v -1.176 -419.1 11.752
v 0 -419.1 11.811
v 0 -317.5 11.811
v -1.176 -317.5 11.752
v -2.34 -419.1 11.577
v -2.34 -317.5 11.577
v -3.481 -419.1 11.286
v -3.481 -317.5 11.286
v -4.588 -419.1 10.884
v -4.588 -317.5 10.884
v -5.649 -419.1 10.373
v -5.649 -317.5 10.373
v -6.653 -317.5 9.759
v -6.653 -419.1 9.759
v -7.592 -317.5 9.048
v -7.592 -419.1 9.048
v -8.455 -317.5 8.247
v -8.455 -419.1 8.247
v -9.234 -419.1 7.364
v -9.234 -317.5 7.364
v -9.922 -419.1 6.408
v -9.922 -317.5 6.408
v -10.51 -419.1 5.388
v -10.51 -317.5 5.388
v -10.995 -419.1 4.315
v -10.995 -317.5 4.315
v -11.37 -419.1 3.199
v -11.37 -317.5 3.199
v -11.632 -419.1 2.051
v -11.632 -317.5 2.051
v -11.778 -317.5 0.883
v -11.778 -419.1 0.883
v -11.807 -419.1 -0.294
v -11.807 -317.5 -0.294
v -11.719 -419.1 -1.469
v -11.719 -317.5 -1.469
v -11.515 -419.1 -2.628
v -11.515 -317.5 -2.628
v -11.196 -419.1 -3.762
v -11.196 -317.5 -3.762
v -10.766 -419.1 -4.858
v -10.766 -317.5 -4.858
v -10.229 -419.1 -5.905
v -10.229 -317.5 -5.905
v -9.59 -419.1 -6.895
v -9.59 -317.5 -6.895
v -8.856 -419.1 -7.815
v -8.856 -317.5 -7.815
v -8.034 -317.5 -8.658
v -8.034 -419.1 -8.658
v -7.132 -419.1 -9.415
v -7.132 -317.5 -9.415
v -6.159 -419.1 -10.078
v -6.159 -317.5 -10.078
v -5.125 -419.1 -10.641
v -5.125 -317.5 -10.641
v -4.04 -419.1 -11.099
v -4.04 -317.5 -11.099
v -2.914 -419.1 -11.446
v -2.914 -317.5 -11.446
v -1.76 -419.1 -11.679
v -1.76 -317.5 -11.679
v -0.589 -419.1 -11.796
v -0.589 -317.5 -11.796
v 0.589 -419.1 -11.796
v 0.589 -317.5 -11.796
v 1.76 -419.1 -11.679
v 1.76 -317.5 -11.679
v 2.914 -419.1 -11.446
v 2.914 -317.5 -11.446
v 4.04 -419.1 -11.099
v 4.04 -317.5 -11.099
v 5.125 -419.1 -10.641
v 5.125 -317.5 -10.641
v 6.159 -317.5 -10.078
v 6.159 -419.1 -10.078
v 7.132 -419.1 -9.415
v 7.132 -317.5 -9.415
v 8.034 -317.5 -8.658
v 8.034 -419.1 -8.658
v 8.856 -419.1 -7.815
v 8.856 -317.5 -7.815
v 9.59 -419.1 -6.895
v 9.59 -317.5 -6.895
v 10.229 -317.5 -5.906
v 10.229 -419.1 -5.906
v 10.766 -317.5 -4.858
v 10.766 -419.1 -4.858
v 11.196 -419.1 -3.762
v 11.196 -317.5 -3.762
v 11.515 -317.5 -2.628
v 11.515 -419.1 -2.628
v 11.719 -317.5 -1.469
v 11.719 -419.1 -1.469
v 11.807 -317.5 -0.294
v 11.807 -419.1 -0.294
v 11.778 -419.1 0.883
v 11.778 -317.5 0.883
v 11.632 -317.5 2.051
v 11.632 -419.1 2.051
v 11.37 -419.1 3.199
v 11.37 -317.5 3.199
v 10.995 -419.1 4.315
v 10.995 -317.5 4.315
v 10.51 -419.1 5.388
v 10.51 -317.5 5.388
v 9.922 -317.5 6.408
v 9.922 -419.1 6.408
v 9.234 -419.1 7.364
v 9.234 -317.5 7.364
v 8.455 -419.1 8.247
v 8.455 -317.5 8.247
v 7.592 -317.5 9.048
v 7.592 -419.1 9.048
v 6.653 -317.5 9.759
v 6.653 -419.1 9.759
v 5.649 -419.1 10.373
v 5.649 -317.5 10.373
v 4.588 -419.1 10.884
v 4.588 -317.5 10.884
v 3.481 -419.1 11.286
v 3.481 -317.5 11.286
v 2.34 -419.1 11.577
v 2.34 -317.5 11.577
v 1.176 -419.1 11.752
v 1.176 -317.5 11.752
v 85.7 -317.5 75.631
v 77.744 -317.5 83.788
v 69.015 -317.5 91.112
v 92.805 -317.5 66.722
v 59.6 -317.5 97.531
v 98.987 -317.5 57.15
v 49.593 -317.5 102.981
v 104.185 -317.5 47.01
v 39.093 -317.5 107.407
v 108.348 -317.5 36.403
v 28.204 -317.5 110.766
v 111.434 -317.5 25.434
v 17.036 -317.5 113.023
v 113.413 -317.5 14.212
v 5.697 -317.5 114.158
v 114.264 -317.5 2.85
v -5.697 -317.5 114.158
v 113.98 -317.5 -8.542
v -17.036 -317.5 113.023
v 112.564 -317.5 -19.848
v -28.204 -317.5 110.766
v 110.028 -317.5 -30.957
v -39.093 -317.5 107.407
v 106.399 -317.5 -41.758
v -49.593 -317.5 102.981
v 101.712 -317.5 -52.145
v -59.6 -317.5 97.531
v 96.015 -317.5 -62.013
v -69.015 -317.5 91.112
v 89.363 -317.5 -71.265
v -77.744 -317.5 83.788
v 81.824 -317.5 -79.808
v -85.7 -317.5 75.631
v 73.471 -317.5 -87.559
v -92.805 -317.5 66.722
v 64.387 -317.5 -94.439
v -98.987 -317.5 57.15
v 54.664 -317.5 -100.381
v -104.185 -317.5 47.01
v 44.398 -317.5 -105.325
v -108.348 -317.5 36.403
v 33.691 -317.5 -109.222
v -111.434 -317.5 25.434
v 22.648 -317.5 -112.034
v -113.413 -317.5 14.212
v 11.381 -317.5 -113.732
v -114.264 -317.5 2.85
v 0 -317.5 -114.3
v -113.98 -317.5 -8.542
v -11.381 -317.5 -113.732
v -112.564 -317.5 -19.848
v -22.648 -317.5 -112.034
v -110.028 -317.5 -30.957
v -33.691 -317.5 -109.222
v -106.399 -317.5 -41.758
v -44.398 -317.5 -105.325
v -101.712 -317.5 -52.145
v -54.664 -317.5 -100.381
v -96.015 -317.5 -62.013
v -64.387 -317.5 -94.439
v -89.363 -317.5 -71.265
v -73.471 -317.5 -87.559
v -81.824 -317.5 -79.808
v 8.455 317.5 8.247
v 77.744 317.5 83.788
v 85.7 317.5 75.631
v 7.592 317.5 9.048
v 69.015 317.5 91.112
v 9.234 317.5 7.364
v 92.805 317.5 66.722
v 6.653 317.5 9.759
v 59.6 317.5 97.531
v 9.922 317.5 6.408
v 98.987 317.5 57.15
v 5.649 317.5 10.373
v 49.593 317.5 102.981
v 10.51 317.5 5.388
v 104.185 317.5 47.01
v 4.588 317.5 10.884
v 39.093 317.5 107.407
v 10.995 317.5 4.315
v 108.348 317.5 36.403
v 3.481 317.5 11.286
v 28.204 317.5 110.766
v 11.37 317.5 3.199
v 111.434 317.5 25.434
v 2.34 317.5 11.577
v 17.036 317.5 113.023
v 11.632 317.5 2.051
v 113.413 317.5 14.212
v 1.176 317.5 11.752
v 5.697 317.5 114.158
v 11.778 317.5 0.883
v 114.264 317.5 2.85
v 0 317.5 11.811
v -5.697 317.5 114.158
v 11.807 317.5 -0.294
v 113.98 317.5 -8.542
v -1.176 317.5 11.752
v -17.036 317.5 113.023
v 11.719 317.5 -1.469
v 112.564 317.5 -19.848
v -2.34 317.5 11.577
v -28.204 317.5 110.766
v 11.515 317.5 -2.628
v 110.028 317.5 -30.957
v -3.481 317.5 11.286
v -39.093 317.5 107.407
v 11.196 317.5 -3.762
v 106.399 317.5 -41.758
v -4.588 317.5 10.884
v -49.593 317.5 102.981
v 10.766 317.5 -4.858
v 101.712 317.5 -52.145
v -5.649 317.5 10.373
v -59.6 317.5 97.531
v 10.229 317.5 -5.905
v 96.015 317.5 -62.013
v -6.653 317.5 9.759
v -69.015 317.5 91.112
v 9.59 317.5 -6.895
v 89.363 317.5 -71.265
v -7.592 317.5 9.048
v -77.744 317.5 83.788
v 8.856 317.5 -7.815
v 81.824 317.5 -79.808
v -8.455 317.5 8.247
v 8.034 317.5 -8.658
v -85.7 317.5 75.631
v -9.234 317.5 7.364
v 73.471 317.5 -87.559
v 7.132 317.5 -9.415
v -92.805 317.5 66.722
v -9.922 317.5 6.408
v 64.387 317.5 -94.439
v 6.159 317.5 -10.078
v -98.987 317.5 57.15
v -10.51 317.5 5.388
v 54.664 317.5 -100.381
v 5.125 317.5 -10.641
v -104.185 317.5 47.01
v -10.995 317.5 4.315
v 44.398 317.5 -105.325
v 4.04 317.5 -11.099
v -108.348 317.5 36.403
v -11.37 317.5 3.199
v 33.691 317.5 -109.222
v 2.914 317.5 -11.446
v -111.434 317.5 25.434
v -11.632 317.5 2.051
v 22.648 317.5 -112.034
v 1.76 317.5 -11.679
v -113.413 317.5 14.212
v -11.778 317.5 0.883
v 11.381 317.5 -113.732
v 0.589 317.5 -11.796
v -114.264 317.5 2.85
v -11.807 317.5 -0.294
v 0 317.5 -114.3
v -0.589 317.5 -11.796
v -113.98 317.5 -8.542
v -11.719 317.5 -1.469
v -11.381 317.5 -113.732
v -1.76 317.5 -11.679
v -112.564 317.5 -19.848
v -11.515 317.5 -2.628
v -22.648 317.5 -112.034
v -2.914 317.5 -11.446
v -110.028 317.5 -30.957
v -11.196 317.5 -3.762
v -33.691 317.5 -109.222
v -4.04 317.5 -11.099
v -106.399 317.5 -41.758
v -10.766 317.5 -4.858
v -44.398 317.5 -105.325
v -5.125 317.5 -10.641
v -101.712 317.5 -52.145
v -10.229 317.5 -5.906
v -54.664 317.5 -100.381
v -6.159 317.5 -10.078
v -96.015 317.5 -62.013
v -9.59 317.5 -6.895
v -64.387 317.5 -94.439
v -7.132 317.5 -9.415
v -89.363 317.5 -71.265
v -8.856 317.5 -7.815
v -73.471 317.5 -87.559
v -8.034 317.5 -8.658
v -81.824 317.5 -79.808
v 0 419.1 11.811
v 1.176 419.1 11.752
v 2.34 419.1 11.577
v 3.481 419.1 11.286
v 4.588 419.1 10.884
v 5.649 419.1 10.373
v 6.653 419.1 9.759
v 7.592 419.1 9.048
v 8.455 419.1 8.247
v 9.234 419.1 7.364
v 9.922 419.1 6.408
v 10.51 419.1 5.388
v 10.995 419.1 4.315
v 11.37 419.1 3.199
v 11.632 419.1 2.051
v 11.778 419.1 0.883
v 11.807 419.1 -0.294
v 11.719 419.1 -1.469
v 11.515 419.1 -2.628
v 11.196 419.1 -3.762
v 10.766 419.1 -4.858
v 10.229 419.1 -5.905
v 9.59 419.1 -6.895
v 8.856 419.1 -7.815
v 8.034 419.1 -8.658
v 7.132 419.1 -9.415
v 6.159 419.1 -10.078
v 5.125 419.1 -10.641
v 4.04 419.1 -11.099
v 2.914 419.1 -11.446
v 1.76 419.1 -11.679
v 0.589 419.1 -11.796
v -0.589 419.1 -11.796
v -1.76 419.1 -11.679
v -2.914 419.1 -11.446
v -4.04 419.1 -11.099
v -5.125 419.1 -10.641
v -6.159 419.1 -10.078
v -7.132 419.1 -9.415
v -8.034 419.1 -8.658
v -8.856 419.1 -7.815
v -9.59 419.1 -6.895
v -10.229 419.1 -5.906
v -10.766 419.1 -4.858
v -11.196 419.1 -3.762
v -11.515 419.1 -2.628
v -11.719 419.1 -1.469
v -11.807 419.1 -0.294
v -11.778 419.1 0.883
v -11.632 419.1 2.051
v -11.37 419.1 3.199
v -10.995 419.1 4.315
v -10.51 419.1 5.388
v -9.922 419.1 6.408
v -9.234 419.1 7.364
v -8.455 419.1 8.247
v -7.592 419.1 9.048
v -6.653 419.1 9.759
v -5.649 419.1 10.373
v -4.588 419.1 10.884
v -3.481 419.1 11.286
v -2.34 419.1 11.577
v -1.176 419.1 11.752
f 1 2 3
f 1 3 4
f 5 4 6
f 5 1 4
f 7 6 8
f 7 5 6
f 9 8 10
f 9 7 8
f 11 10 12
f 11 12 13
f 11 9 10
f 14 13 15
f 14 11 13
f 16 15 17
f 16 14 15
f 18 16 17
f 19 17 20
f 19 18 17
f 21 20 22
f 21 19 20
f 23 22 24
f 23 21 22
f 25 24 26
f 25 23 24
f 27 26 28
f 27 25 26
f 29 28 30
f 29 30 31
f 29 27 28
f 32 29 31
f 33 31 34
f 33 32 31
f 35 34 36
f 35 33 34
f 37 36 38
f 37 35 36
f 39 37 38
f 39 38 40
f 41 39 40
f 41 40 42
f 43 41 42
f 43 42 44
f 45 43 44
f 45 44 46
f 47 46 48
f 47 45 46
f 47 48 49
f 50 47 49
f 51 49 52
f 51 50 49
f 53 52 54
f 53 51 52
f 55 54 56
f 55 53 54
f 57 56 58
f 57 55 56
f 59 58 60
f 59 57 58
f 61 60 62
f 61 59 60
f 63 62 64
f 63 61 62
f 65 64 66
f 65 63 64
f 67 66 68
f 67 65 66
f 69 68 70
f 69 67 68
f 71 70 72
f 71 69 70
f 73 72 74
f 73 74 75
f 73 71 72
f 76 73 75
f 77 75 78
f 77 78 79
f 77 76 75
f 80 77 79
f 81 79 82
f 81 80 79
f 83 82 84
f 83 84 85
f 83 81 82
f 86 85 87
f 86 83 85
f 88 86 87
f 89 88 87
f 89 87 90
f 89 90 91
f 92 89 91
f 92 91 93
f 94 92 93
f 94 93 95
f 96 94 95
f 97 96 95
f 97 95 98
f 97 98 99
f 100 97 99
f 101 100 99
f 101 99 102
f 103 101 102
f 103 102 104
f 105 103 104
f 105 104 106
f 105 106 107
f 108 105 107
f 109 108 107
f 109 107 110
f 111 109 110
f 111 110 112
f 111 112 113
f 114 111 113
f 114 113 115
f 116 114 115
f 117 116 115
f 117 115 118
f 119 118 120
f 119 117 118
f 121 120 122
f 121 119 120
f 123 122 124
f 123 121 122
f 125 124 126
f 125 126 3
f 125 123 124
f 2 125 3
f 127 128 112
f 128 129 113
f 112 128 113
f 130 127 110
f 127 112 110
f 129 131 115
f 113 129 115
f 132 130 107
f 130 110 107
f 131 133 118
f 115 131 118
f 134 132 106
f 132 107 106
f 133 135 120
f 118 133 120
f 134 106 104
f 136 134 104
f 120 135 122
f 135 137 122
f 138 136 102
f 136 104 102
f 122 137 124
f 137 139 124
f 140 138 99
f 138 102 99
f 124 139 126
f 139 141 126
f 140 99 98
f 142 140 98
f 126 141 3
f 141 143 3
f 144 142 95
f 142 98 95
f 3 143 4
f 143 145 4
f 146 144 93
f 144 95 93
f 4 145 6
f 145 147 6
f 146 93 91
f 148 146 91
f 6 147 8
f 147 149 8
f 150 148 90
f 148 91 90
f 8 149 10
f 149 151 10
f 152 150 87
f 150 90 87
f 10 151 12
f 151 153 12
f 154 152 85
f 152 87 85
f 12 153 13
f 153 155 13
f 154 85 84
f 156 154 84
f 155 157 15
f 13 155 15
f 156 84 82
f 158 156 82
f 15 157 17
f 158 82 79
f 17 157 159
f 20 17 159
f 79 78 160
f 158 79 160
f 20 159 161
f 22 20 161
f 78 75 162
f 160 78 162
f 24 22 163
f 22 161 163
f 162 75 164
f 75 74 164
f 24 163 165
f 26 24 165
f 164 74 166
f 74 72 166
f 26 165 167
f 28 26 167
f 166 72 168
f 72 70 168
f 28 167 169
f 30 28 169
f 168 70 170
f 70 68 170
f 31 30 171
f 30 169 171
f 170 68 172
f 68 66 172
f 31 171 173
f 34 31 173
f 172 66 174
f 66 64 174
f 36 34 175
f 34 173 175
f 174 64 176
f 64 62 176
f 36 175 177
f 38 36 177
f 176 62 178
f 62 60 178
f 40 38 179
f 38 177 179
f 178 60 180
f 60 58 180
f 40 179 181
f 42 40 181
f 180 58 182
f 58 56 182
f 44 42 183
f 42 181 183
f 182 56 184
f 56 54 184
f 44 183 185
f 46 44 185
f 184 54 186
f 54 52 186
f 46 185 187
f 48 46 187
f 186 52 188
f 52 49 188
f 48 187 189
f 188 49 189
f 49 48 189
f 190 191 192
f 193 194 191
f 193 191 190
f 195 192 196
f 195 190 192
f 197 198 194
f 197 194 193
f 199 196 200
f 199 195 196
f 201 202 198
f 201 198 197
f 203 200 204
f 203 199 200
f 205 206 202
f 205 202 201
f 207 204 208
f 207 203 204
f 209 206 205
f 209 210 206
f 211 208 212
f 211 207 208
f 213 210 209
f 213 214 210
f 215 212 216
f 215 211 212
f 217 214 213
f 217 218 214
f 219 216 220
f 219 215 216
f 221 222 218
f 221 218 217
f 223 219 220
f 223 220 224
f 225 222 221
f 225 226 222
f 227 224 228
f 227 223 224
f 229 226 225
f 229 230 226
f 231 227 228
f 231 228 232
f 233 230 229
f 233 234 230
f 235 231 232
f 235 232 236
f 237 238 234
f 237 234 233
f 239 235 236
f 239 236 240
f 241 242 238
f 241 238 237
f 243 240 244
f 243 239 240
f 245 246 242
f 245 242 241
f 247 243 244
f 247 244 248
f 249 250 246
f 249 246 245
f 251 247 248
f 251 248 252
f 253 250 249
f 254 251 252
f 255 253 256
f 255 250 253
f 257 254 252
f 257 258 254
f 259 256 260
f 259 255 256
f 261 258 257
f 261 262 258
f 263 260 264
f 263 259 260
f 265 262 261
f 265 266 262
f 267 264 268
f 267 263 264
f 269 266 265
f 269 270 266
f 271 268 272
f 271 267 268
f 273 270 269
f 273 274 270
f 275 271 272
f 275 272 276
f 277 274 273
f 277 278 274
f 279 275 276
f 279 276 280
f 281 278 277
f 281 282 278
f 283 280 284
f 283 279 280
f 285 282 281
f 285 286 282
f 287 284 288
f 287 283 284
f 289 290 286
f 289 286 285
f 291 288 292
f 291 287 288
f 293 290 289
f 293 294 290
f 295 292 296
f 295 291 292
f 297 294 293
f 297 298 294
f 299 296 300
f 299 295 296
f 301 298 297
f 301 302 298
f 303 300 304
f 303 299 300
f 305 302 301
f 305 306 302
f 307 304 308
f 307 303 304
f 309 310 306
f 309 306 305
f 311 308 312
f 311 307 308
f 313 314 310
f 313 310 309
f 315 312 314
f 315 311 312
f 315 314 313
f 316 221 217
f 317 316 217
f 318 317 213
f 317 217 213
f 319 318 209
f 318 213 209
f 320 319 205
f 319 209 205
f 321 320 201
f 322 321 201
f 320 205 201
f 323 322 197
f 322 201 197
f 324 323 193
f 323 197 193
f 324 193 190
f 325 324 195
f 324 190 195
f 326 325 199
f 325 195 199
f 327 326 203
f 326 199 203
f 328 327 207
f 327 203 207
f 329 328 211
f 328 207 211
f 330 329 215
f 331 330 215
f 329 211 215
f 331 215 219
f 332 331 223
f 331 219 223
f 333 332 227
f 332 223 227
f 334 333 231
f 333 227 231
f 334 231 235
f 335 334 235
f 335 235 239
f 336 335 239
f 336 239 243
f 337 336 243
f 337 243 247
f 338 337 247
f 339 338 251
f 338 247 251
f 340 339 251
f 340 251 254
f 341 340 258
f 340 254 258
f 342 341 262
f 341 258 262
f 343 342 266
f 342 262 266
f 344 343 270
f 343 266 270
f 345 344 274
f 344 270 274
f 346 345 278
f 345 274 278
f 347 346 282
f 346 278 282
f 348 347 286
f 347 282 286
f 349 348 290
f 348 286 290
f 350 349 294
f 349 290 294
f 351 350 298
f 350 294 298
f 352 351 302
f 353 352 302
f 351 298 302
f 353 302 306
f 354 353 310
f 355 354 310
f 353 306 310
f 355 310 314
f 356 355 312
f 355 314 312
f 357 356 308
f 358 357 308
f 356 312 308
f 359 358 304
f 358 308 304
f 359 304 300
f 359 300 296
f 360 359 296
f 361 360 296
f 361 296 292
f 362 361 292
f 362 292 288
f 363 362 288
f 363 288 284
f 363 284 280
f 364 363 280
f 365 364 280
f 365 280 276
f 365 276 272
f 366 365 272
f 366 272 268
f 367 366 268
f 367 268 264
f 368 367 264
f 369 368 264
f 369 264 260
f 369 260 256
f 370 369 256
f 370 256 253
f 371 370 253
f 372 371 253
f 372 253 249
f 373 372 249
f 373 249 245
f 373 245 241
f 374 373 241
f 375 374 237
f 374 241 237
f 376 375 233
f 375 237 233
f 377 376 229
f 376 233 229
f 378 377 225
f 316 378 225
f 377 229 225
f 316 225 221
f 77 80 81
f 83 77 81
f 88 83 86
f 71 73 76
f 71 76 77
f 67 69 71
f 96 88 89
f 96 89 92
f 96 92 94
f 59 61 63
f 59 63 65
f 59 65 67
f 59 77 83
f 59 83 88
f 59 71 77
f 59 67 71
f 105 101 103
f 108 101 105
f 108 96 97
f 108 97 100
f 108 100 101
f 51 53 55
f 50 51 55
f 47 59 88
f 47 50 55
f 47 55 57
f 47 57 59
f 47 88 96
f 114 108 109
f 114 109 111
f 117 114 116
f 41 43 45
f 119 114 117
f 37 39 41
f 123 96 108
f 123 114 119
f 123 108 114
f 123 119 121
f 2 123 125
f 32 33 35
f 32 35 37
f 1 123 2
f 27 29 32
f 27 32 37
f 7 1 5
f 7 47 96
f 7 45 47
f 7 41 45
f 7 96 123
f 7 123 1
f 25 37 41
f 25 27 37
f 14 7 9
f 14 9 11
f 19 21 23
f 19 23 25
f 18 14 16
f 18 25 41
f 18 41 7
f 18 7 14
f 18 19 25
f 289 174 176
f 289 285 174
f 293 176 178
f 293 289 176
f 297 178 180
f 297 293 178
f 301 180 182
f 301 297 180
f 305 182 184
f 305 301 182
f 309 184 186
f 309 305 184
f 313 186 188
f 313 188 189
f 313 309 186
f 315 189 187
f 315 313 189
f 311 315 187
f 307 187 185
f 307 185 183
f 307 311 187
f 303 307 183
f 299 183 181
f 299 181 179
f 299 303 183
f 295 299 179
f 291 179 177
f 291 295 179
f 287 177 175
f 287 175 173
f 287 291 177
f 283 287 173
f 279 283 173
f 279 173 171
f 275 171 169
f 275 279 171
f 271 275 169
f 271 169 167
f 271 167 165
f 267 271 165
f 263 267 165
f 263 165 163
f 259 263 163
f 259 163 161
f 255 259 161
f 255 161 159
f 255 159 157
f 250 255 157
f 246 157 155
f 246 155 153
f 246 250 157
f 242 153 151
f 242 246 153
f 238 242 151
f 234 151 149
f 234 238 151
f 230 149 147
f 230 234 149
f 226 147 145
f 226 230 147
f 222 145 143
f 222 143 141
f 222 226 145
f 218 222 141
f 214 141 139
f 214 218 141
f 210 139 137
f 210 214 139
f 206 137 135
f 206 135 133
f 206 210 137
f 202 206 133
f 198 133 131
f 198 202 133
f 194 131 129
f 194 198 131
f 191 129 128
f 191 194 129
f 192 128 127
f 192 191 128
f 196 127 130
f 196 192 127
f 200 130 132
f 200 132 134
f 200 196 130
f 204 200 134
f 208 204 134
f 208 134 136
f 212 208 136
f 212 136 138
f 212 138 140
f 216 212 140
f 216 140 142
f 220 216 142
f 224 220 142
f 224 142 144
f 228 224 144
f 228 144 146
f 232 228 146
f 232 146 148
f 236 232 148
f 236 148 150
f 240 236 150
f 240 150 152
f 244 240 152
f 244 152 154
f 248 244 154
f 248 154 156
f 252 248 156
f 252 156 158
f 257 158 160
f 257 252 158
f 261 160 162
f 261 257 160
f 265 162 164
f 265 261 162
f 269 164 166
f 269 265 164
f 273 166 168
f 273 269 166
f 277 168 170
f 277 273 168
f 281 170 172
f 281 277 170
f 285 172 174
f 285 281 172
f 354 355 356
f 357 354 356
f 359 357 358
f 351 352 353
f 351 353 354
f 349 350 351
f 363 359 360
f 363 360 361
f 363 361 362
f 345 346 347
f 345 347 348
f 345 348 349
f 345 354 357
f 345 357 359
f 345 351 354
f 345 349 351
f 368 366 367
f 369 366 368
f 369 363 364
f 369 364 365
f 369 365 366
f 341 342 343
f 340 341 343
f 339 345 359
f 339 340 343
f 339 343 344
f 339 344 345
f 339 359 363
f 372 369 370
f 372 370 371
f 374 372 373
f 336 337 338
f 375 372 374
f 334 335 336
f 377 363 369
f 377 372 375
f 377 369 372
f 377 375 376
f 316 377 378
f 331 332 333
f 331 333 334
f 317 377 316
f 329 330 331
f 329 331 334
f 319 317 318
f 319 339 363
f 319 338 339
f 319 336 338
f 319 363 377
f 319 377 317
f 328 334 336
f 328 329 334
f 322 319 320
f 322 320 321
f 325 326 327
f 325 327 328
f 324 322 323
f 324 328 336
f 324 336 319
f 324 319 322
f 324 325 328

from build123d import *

# Parameters (mm, degrees)
SKETCH1_R           = 114.3
BOSS_EXTRUDE1_DEPTH = 317.5
SKETCH2_R           = 11.811
BOSS_EXTRUDE2_DEPTH = 101.6
BOSS_EXTRUDE3_START = 101.6
SKETCH3_R           = 11.811
BOSS_EXTRUDE3_DEPTH = 101.6


with BuildPart() as part:
    # Sketch1 → Boss-Extrude1 (new, symmetric)
    with BuildSketch(Plane(origin=(0, 0, 0), x_dir=(1, 0, 0), z_dir=(0, 1, 0))):
        with Locations(Location((0, 0, 0), (0, 0, 90))):
            Circle(SKETCH1_R)
    extrude(amount=BOSS_EXTRUDE1_DEPTH, both=True)

    # Sketch2 → Boss-Extrude2 (add)
    with BuildSketch(Plane(origin=(0, 317.5, 0), x_dir=(1, 0, 0), z_dir=(0, 1, 0))):
        with Locations(Location((0, 0, 0), (0, 0, 270))):
            Circle(SKETCH2_R)
    extrude(amount=BOSS_EXTRUDE2_DEPTH)

    # Sketch3 → Boss-Extrude3 (add)
    with BuildSketch(Plane.XZ.offset(317.5).offset(BOSS_EXTRUDE3_START)):
        with Locations(Location((0, 0, 0), (0, 0, 90))):
            Circle(SKETCH3_R)
    extrude(amount=-BOSS_EXTRUDE3_DEPTH)


solid = part.part
